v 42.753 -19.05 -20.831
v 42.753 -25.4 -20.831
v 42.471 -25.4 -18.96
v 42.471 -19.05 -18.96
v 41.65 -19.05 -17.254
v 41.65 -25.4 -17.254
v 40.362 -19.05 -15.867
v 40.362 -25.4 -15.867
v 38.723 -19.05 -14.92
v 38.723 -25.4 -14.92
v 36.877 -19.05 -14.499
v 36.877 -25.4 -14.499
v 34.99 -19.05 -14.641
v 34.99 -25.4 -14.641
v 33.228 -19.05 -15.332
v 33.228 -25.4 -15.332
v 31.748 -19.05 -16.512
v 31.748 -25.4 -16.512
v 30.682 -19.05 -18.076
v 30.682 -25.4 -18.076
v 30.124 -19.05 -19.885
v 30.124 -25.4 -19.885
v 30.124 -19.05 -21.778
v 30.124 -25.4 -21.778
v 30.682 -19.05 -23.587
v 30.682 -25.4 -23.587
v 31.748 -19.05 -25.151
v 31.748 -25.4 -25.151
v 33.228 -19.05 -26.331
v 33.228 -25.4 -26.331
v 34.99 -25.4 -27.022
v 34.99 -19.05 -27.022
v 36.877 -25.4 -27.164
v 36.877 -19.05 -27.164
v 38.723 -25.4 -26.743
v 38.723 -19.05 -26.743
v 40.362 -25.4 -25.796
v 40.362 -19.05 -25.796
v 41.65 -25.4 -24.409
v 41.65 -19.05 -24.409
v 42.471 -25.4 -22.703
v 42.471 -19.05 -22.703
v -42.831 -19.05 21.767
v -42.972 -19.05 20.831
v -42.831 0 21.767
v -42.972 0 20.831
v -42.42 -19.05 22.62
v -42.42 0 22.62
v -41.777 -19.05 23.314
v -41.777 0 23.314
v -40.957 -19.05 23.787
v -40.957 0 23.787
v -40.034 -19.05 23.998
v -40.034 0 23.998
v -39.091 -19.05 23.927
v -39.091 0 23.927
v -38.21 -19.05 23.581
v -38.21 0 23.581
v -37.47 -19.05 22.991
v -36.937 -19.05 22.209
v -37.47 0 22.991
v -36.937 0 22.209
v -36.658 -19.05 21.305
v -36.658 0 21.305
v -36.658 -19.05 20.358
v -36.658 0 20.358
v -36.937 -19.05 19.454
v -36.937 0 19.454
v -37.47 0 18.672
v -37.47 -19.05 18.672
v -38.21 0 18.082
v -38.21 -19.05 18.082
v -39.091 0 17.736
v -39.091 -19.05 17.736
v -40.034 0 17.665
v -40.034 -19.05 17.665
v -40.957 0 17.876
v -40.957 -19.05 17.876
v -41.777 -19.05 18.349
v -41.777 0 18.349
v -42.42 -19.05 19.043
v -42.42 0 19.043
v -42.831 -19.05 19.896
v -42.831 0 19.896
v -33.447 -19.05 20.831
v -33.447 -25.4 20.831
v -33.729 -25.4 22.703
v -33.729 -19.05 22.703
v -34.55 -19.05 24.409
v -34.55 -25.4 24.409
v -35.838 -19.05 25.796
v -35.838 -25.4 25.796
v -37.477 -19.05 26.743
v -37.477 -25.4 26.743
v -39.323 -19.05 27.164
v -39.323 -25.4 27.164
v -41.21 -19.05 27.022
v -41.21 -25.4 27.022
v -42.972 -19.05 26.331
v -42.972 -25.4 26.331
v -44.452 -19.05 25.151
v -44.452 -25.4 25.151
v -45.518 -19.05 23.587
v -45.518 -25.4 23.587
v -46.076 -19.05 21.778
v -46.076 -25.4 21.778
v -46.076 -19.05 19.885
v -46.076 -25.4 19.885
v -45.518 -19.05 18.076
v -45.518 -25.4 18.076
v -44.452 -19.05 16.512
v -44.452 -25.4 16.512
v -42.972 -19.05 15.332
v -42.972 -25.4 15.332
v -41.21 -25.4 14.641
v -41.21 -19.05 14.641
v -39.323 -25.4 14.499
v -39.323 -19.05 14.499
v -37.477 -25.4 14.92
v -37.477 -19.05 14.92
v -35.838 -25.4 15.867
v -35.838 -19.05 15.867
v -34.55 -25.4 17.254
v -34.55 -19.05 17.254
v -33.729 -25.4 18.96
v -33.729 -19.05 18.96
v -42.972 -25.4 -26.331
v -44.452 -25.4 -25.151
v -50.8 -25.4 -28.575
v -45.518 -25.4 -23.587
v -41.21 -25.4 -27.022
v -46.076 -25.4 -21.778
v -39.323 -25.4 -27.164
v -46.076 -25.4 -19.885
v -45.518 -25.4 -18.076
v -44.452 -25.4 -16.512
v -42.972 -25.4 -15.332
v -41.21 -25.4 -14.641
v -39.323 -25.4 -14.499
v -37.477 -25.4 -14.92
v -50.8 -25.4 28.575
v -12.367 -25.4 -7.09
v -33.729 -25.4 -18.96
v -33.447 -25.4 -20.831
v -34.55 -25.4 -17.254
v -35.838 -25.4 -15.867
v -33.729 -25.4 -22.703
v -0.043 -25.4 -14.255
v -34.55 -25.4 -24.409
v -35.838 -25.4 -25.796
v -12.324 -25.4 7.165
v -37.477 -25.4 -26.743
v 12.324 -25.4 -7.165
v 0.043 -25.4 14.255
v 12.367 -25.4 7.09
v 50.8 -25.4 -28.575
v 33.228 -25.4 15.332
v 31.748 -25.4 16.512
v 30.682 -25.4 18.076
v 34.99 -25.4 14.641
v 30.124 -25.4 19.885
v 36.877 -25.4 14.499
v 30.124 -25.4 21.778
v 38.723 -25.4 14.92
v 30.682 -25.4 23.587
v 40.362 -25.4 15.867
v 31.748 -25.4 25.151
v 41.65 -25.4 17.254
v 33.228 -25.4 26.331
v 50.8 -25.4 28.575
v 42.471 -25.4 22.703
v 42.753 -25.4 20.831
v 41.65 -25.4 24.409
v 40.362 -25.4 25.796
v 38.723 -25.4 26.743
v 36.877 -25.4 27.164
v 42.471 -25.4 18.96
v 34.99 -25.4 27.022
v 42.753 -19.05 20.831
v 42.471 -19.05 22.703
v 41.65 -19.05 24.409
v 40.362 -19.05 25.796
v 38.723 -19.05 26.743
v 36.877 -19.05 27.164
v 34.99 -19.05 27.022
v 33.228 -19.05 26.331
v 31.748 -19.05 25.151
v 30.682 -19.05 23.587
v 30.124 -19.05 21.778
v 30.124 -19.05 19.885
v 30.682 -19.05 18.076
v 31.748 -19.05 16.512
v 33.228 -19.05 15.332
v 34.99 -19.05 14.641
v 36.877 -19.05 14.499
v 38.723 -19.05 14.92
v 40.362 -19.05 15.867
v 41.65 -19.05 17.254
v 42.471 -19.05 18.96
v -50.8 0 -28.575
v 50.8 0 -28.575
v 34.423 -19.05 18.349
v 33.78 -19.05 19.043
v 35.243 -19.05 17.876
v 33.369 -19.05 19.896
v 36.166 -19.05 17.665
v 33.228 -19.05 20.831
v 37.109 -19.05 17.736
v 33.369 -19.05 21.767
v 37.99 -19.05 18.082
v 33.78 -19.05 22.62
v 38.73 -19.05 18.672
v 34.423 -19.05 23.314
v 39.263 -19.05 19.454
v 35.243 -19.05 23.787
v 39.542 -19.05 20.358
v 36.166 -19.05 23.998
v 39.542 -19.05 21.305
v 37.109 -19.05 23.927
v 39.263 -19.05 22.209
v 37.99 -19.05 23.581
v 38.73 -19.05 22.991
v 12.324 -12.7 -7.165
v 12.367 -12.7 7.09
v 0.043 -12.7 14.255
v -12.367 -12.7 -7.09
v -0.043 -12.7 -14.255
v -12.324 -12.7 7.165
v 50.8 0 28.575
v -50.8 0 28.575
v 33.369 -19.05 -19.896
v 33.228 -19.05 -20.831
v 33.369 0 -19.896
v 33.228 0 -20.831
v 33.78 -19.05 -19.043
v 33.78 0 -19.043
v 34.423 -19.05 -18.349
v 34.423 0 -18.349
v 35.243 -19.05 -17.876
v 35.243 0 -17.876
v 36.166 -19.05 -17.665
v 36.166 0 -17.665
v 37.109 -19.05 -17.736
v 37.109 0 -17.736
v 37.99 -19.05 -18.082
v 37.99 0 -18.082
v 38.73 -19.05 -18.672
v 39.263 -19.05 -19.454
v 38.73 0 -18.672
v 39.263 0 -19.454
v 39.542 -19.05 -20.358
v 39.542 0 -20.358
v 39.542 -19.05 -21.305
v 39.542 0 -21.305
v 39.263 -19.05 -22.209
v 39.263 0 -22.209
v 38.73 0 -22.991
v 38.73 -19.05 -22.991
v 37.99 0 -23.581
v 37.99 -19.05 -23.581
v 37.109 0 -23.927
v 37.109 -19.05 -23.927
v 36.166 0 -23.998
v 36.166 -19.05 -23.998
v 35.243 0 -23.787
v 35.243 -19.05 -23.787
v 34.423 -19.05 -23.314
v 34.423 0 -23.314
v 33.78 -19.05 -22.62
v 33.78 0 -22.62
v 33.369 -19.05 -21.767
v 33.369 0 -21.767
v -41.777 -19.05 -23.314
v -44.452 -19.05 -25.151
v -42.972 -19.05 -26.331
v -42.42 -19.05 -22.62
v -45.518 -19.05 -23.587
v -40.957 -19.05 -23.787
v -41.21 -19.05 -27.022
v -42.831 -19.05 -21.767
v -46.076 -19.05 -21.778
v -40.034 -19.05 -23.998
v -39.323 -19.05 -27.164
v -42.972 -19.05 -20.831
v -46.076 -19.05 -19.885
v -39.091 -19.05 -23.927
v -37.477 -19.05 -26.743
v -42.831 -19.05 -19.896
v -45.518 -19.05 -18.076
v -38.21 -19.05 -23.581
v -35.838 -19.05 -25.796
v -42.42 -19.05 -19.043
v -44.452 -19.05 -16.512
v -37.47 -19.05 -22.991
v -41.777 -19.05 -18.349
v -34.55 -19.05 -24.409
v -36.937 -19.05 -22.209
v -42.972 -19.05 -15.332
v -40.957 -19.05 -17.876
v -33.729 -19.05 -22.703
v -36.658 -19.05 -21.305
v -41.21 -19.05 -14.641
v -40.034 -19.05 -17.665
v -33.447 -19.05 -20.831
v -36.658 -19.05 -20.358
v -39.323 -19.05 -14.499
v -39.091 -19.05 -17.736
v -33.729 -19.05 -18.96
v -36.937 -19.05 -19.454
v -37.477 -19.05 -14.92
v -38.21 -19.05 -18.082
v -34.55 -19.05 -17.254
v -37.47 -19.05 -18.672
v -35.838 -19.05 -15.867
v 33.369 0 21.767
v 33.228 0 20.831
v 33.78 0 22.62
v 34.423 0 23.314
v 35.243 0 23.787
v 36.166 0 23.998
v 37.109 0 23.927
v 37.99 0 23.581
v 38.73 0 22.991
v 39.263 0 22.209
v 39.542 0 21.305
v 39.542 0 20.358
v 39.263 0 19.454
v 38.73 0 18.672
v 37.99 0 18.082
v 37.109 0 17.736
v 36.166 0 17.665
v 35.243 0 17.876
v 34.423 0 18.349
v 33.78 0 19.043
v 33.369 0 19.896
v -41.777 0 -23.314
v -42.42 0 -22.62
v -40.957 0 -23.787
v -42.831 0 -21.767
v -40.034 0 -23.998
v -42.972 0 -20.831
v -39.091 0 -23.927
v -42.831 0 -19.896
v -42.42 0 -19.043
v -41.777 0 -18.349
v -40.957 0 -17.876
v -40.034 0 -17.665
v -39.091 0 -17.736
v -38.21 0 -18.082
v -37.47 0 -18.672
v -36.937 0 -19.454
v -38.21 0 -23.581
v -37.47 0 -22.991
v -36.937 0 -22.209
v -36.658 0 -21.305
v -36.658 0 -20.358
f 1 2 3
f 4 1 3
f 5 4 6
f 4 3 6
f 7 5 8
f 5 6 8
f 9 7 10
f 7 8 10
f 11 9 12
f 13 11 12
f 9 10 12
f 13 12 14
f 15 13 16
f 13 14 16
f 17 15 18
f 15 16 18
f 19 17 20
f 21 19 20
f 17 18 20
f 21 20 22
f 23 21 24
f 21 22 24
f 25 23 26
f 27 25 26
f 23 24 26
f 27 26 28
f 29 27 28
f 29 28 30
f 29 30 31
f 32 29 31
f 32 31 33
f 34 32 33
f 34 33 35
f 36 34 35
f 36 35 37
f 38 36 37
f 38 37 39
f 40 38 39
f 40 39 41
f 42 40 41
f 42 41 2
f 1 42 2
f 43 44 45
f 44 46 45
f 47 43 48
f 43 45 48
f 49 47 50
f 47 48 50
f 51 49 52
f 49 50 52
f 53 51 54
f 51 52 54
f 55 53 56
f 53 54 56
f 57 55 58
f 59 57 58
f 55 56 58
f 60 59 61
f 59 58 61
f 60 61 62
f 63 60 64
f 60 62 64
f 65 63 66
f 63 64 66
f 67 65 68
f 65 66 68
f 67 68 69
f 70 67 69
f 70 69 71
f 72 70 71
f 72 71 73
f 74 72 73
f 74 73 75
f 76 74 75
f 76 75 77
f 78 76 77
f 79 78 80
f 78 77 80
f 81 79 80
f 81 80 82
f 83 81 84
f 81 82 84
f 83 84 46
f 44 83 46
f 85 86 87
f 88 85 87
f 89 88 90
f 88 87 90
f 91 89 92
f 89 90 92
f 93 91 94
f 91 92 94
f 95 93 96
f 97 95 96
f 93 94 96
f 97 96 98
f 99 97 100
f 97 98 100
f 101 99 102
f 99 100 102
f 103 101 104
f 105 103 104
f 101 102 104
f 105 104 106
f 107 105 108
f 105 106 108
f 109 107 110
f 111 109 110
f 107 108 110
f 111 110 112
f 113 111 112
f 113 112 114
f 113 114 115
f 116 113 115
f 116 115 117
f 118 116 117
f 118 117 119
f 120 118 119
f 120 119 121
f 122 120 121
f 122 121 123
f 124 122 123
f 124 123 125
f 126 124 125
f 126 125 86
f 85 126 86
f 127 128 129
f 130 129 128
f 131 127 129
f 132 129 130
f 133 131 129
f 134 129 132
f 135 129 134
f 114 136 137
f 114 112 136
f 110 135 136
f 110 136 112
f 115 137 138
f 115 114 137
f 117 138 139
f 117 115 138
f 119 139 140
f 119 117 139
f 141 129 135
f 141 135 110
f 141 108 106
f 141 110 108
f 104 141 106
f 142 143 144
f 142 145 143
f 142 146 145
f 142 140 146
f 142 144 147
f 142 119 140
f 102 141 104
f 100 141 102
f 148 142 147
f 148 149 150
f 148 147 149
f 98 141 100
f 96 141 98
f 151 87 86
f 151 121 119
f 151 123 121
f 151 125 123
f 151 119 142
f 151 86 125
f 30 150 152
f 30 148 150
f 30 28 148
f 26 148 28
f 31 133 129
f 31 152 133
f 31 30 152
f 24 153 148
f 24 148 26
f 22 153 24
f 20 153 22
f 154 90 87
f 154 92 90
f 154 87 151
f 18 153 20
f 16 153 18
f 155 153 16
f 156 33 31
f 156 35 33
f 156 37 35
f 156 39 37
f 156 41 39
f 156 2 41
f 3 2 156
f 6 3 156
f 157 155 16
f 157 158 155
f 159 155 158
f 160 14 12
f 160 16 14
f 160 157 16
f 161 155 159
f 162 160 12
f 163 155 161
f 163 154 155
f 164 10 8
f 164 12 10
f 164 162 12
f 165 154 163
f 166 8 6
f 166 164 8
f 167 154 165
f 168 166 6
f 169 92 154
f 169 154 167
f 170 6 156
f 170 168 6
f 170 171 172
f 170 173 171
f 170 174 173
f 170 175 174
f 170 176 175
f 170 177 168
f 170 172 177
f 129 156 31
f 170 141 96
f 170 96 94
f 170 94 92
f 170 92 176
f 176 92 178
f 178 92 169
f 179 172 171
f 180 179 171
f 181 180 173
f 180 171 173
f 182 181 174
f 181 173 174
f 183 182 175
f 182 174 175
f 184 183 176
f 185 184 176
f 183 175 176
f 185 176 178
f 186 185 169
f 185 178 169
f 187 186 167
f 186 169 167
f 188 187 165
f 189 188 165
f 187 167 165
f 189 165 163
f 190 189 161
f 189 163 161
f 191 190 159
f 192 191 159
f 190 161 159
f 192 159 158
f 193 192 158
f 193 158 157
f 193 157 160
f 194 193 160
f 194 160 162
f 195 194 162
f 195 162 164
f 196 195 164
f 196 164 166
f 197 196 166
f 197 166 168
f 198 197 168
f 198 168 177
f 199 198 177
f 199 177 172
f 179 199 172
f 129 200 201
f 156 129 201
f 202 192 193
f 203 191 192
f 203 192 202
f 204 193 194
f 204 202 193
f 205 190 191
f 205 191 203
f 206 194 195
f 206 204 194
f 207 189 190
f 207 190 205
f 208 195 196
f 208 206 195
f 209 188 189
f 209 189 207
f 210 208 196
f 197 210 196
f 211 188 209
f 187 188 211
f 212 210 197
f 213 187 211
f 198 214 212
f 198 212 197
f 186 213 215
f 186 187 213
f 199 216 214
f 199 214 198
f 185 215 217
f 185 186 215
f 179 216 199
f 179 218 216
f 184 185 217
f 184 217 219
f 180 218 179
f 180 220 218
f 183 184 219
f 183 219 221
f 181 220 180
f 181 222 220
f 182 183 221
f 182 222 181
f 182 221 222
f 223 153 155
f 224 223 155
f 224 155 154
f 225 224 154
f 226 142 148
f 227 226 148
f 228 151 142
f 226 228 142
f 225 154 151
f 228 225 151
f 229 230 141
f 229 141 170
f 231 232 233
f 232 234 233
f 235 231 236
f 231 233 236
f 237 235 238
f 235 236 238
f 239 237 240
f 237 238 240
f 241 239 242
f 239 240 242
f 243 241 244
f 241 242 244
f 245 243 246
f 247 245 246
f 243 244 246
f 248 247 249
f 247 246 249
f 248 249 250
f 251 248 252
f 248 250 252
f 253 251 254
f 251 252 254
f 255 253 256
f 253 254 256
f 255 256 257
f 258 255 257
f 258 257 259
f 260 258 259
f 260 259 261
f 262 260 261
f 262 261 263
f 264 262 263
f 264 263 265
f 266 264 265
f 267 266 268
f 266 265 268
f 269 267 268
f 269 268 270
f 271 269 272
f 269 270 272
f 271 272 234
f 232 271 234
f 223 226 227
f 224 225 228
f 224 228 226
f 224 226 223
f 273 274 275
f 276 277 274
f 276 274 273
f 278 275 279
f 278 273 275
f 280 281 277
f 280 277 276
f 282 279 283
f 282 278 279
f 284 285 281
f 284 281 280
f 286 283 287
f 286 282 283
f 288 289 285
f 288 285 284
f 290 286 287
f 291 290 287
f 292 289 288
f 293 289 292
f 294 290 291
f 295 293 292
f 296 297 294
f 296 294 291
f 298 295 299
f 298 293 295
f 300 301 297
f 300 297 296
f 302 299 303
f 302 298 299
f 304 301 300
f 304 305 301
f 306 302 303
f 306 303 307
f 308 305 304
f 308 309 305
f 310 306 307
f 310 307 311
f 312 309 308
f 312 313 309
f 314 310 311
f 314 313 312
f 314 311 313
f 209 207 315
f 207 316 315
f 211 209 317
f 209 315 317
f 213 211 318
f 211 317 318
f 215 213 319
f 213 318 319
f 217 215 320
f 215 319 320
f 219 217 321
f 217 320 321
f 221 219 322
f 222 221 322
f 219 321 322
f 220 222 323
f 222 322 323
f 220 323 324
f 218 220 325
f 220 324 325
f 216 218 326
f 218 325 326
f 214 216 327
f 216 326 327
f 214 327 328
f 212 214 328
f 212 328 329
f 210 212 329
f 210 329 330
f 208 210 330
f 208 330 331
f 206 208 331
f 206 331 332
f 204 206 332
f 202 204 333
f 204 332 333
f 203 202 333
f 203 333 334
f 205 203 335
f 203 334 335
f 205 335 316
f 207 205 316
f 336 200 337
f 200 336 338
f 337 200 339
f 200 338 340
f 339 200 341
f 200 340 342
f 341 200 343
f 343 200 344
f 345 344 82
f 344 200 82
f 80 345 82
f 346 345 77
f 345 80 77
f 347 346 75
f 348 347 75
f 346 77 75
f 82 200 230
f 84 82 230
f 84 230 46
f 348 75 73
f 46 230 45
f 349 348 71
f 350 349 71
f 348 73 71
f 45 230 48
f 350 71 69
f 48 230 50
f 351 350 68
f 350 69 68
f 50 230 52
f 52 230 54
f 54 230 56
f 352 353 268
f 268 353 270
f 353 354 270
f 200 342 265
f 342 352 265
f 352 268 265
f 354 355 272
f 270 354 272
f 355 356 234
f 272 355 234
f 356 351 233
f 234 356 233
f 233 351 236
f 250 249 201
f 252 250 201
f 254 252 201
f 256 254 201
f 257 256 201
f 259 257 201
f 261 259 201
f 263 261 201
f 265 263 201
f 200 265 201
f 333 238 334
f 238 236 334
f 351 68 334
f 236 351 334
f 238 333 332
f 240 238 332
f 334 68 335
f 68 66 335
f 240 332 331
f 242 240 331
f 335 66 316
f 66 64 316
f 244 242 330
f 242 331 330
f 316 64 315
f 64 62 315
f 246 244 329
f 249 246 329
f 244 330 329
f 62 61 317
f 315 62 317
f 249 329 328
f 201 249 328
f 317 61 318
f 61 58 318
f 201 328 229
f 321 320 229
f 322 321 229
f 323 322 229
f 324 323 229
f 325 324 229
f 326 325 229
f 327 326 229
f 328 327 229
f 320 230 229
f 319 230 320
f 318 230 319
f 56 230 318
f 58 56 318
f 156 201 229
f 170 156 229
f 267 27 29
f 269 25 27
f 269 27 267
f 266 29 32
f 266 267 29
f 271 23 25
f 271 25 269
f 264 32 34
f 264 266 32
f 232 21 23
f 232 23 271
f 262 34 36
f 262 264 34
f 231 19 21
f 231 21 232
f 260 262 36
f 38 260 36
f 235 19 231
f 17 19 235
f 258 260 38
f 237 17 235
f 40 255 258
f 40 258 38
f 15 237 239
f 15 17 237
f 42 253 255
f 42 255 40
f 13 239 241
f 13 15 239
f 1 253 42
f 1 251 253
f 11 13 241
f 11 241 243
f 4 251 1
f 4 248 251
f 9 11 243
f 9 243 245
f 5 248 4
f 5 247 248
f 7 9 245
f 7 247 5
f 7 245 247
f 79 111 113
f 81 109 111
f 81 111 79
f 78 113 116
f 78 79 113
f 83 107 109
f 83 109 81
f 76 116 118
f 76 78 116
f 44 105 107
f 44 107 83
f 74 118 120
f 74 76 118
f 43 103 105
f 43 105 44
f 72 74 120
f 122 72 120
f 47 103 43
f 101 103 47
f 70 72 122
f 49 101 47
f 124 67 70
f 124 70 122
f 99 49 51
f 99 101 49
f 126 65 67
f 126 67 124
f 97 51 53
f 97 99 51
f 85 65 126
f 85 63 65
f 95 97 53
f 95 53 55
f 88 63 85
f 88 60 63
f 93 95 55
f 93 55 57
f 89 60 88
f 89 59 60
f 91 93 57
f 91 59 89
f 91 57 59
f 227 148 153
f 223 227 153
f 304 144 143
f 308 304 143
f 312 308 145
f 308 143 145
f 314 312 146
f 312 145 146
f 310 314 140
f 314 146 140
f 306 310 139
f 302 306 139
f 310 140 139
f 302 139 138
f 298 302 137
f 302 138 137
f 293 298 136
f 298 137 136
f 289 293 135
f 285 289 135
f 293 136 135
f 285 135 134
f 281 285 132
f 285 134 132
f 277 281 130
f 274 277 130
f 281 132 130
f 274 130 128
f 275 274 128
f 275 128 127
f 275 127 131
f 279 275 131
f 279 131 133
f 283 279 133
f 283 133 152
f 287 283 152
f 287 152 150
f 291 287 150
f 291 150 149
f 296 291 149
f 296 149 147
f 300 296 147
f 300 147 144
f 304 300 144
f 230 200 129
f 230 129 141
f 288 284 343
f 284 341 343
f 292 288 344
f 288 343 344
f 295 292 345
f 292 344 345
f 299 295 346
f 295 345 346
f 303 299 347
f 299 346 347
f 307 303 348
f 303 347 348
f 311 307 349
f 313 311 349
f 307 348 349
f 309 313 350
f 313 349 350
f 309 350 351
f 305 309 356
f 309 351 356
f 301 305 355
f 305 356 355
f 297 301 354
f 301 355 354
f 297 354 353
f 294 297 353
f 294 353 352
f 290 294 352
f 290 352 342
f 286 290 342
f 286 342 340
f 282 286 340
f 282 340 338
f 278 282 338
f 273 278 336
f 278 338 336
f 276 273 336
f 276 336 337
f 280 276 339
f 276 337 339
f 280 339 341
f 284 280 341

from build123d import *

# Parameters (mm, degrees)
F0_W           = 101.6
F0_H           = 57.15
F1_DEPTH       = 25.4
F3_D           = 6.35
F3_CBORE_D     = 12.7
F3_CBORE_DEPTH = 6.35
F5_DEPTH       = 12.7


with BuildPart() as f1:
    # F0 (on Front) → F1 (new body)
    with BuildSketch(Plane.XZ):
        Rectangle(F0_W, F0_H)
    extrude(amount=F1_DEPTH)

    # F3 (through all)
    with Locations(Plane.XZ.offset(25.4)):
        with Locations((36.4028997615, 20.831474103), (36.4028997615, -20.831474103), (-39.7971002385, 20.831474103), (-39.7971002385, -20.831474103)):
            CounterBoreHole(F3_D / 2, F3_CBORE_D / 2, F3_CBORE_DEPTH)

    # F4 (on face) → F5 (cut)
    with BuildSketch(Plane.XZ.offset(25.4)):
        Polygon((-0.0431249981, -14.2548758505), (12.3235221152, -7.1647852691), (12.3666471133, 7.0900905813), (0.0431249981, 14.2548758505), (-12.3235221152, 7.1647852691), (-12.3666471133, -7.0900905813), align=None)
    extrude(amount=-F5_DEPTH, mode=Mode.SUBTRACT)


solid = f1.part
